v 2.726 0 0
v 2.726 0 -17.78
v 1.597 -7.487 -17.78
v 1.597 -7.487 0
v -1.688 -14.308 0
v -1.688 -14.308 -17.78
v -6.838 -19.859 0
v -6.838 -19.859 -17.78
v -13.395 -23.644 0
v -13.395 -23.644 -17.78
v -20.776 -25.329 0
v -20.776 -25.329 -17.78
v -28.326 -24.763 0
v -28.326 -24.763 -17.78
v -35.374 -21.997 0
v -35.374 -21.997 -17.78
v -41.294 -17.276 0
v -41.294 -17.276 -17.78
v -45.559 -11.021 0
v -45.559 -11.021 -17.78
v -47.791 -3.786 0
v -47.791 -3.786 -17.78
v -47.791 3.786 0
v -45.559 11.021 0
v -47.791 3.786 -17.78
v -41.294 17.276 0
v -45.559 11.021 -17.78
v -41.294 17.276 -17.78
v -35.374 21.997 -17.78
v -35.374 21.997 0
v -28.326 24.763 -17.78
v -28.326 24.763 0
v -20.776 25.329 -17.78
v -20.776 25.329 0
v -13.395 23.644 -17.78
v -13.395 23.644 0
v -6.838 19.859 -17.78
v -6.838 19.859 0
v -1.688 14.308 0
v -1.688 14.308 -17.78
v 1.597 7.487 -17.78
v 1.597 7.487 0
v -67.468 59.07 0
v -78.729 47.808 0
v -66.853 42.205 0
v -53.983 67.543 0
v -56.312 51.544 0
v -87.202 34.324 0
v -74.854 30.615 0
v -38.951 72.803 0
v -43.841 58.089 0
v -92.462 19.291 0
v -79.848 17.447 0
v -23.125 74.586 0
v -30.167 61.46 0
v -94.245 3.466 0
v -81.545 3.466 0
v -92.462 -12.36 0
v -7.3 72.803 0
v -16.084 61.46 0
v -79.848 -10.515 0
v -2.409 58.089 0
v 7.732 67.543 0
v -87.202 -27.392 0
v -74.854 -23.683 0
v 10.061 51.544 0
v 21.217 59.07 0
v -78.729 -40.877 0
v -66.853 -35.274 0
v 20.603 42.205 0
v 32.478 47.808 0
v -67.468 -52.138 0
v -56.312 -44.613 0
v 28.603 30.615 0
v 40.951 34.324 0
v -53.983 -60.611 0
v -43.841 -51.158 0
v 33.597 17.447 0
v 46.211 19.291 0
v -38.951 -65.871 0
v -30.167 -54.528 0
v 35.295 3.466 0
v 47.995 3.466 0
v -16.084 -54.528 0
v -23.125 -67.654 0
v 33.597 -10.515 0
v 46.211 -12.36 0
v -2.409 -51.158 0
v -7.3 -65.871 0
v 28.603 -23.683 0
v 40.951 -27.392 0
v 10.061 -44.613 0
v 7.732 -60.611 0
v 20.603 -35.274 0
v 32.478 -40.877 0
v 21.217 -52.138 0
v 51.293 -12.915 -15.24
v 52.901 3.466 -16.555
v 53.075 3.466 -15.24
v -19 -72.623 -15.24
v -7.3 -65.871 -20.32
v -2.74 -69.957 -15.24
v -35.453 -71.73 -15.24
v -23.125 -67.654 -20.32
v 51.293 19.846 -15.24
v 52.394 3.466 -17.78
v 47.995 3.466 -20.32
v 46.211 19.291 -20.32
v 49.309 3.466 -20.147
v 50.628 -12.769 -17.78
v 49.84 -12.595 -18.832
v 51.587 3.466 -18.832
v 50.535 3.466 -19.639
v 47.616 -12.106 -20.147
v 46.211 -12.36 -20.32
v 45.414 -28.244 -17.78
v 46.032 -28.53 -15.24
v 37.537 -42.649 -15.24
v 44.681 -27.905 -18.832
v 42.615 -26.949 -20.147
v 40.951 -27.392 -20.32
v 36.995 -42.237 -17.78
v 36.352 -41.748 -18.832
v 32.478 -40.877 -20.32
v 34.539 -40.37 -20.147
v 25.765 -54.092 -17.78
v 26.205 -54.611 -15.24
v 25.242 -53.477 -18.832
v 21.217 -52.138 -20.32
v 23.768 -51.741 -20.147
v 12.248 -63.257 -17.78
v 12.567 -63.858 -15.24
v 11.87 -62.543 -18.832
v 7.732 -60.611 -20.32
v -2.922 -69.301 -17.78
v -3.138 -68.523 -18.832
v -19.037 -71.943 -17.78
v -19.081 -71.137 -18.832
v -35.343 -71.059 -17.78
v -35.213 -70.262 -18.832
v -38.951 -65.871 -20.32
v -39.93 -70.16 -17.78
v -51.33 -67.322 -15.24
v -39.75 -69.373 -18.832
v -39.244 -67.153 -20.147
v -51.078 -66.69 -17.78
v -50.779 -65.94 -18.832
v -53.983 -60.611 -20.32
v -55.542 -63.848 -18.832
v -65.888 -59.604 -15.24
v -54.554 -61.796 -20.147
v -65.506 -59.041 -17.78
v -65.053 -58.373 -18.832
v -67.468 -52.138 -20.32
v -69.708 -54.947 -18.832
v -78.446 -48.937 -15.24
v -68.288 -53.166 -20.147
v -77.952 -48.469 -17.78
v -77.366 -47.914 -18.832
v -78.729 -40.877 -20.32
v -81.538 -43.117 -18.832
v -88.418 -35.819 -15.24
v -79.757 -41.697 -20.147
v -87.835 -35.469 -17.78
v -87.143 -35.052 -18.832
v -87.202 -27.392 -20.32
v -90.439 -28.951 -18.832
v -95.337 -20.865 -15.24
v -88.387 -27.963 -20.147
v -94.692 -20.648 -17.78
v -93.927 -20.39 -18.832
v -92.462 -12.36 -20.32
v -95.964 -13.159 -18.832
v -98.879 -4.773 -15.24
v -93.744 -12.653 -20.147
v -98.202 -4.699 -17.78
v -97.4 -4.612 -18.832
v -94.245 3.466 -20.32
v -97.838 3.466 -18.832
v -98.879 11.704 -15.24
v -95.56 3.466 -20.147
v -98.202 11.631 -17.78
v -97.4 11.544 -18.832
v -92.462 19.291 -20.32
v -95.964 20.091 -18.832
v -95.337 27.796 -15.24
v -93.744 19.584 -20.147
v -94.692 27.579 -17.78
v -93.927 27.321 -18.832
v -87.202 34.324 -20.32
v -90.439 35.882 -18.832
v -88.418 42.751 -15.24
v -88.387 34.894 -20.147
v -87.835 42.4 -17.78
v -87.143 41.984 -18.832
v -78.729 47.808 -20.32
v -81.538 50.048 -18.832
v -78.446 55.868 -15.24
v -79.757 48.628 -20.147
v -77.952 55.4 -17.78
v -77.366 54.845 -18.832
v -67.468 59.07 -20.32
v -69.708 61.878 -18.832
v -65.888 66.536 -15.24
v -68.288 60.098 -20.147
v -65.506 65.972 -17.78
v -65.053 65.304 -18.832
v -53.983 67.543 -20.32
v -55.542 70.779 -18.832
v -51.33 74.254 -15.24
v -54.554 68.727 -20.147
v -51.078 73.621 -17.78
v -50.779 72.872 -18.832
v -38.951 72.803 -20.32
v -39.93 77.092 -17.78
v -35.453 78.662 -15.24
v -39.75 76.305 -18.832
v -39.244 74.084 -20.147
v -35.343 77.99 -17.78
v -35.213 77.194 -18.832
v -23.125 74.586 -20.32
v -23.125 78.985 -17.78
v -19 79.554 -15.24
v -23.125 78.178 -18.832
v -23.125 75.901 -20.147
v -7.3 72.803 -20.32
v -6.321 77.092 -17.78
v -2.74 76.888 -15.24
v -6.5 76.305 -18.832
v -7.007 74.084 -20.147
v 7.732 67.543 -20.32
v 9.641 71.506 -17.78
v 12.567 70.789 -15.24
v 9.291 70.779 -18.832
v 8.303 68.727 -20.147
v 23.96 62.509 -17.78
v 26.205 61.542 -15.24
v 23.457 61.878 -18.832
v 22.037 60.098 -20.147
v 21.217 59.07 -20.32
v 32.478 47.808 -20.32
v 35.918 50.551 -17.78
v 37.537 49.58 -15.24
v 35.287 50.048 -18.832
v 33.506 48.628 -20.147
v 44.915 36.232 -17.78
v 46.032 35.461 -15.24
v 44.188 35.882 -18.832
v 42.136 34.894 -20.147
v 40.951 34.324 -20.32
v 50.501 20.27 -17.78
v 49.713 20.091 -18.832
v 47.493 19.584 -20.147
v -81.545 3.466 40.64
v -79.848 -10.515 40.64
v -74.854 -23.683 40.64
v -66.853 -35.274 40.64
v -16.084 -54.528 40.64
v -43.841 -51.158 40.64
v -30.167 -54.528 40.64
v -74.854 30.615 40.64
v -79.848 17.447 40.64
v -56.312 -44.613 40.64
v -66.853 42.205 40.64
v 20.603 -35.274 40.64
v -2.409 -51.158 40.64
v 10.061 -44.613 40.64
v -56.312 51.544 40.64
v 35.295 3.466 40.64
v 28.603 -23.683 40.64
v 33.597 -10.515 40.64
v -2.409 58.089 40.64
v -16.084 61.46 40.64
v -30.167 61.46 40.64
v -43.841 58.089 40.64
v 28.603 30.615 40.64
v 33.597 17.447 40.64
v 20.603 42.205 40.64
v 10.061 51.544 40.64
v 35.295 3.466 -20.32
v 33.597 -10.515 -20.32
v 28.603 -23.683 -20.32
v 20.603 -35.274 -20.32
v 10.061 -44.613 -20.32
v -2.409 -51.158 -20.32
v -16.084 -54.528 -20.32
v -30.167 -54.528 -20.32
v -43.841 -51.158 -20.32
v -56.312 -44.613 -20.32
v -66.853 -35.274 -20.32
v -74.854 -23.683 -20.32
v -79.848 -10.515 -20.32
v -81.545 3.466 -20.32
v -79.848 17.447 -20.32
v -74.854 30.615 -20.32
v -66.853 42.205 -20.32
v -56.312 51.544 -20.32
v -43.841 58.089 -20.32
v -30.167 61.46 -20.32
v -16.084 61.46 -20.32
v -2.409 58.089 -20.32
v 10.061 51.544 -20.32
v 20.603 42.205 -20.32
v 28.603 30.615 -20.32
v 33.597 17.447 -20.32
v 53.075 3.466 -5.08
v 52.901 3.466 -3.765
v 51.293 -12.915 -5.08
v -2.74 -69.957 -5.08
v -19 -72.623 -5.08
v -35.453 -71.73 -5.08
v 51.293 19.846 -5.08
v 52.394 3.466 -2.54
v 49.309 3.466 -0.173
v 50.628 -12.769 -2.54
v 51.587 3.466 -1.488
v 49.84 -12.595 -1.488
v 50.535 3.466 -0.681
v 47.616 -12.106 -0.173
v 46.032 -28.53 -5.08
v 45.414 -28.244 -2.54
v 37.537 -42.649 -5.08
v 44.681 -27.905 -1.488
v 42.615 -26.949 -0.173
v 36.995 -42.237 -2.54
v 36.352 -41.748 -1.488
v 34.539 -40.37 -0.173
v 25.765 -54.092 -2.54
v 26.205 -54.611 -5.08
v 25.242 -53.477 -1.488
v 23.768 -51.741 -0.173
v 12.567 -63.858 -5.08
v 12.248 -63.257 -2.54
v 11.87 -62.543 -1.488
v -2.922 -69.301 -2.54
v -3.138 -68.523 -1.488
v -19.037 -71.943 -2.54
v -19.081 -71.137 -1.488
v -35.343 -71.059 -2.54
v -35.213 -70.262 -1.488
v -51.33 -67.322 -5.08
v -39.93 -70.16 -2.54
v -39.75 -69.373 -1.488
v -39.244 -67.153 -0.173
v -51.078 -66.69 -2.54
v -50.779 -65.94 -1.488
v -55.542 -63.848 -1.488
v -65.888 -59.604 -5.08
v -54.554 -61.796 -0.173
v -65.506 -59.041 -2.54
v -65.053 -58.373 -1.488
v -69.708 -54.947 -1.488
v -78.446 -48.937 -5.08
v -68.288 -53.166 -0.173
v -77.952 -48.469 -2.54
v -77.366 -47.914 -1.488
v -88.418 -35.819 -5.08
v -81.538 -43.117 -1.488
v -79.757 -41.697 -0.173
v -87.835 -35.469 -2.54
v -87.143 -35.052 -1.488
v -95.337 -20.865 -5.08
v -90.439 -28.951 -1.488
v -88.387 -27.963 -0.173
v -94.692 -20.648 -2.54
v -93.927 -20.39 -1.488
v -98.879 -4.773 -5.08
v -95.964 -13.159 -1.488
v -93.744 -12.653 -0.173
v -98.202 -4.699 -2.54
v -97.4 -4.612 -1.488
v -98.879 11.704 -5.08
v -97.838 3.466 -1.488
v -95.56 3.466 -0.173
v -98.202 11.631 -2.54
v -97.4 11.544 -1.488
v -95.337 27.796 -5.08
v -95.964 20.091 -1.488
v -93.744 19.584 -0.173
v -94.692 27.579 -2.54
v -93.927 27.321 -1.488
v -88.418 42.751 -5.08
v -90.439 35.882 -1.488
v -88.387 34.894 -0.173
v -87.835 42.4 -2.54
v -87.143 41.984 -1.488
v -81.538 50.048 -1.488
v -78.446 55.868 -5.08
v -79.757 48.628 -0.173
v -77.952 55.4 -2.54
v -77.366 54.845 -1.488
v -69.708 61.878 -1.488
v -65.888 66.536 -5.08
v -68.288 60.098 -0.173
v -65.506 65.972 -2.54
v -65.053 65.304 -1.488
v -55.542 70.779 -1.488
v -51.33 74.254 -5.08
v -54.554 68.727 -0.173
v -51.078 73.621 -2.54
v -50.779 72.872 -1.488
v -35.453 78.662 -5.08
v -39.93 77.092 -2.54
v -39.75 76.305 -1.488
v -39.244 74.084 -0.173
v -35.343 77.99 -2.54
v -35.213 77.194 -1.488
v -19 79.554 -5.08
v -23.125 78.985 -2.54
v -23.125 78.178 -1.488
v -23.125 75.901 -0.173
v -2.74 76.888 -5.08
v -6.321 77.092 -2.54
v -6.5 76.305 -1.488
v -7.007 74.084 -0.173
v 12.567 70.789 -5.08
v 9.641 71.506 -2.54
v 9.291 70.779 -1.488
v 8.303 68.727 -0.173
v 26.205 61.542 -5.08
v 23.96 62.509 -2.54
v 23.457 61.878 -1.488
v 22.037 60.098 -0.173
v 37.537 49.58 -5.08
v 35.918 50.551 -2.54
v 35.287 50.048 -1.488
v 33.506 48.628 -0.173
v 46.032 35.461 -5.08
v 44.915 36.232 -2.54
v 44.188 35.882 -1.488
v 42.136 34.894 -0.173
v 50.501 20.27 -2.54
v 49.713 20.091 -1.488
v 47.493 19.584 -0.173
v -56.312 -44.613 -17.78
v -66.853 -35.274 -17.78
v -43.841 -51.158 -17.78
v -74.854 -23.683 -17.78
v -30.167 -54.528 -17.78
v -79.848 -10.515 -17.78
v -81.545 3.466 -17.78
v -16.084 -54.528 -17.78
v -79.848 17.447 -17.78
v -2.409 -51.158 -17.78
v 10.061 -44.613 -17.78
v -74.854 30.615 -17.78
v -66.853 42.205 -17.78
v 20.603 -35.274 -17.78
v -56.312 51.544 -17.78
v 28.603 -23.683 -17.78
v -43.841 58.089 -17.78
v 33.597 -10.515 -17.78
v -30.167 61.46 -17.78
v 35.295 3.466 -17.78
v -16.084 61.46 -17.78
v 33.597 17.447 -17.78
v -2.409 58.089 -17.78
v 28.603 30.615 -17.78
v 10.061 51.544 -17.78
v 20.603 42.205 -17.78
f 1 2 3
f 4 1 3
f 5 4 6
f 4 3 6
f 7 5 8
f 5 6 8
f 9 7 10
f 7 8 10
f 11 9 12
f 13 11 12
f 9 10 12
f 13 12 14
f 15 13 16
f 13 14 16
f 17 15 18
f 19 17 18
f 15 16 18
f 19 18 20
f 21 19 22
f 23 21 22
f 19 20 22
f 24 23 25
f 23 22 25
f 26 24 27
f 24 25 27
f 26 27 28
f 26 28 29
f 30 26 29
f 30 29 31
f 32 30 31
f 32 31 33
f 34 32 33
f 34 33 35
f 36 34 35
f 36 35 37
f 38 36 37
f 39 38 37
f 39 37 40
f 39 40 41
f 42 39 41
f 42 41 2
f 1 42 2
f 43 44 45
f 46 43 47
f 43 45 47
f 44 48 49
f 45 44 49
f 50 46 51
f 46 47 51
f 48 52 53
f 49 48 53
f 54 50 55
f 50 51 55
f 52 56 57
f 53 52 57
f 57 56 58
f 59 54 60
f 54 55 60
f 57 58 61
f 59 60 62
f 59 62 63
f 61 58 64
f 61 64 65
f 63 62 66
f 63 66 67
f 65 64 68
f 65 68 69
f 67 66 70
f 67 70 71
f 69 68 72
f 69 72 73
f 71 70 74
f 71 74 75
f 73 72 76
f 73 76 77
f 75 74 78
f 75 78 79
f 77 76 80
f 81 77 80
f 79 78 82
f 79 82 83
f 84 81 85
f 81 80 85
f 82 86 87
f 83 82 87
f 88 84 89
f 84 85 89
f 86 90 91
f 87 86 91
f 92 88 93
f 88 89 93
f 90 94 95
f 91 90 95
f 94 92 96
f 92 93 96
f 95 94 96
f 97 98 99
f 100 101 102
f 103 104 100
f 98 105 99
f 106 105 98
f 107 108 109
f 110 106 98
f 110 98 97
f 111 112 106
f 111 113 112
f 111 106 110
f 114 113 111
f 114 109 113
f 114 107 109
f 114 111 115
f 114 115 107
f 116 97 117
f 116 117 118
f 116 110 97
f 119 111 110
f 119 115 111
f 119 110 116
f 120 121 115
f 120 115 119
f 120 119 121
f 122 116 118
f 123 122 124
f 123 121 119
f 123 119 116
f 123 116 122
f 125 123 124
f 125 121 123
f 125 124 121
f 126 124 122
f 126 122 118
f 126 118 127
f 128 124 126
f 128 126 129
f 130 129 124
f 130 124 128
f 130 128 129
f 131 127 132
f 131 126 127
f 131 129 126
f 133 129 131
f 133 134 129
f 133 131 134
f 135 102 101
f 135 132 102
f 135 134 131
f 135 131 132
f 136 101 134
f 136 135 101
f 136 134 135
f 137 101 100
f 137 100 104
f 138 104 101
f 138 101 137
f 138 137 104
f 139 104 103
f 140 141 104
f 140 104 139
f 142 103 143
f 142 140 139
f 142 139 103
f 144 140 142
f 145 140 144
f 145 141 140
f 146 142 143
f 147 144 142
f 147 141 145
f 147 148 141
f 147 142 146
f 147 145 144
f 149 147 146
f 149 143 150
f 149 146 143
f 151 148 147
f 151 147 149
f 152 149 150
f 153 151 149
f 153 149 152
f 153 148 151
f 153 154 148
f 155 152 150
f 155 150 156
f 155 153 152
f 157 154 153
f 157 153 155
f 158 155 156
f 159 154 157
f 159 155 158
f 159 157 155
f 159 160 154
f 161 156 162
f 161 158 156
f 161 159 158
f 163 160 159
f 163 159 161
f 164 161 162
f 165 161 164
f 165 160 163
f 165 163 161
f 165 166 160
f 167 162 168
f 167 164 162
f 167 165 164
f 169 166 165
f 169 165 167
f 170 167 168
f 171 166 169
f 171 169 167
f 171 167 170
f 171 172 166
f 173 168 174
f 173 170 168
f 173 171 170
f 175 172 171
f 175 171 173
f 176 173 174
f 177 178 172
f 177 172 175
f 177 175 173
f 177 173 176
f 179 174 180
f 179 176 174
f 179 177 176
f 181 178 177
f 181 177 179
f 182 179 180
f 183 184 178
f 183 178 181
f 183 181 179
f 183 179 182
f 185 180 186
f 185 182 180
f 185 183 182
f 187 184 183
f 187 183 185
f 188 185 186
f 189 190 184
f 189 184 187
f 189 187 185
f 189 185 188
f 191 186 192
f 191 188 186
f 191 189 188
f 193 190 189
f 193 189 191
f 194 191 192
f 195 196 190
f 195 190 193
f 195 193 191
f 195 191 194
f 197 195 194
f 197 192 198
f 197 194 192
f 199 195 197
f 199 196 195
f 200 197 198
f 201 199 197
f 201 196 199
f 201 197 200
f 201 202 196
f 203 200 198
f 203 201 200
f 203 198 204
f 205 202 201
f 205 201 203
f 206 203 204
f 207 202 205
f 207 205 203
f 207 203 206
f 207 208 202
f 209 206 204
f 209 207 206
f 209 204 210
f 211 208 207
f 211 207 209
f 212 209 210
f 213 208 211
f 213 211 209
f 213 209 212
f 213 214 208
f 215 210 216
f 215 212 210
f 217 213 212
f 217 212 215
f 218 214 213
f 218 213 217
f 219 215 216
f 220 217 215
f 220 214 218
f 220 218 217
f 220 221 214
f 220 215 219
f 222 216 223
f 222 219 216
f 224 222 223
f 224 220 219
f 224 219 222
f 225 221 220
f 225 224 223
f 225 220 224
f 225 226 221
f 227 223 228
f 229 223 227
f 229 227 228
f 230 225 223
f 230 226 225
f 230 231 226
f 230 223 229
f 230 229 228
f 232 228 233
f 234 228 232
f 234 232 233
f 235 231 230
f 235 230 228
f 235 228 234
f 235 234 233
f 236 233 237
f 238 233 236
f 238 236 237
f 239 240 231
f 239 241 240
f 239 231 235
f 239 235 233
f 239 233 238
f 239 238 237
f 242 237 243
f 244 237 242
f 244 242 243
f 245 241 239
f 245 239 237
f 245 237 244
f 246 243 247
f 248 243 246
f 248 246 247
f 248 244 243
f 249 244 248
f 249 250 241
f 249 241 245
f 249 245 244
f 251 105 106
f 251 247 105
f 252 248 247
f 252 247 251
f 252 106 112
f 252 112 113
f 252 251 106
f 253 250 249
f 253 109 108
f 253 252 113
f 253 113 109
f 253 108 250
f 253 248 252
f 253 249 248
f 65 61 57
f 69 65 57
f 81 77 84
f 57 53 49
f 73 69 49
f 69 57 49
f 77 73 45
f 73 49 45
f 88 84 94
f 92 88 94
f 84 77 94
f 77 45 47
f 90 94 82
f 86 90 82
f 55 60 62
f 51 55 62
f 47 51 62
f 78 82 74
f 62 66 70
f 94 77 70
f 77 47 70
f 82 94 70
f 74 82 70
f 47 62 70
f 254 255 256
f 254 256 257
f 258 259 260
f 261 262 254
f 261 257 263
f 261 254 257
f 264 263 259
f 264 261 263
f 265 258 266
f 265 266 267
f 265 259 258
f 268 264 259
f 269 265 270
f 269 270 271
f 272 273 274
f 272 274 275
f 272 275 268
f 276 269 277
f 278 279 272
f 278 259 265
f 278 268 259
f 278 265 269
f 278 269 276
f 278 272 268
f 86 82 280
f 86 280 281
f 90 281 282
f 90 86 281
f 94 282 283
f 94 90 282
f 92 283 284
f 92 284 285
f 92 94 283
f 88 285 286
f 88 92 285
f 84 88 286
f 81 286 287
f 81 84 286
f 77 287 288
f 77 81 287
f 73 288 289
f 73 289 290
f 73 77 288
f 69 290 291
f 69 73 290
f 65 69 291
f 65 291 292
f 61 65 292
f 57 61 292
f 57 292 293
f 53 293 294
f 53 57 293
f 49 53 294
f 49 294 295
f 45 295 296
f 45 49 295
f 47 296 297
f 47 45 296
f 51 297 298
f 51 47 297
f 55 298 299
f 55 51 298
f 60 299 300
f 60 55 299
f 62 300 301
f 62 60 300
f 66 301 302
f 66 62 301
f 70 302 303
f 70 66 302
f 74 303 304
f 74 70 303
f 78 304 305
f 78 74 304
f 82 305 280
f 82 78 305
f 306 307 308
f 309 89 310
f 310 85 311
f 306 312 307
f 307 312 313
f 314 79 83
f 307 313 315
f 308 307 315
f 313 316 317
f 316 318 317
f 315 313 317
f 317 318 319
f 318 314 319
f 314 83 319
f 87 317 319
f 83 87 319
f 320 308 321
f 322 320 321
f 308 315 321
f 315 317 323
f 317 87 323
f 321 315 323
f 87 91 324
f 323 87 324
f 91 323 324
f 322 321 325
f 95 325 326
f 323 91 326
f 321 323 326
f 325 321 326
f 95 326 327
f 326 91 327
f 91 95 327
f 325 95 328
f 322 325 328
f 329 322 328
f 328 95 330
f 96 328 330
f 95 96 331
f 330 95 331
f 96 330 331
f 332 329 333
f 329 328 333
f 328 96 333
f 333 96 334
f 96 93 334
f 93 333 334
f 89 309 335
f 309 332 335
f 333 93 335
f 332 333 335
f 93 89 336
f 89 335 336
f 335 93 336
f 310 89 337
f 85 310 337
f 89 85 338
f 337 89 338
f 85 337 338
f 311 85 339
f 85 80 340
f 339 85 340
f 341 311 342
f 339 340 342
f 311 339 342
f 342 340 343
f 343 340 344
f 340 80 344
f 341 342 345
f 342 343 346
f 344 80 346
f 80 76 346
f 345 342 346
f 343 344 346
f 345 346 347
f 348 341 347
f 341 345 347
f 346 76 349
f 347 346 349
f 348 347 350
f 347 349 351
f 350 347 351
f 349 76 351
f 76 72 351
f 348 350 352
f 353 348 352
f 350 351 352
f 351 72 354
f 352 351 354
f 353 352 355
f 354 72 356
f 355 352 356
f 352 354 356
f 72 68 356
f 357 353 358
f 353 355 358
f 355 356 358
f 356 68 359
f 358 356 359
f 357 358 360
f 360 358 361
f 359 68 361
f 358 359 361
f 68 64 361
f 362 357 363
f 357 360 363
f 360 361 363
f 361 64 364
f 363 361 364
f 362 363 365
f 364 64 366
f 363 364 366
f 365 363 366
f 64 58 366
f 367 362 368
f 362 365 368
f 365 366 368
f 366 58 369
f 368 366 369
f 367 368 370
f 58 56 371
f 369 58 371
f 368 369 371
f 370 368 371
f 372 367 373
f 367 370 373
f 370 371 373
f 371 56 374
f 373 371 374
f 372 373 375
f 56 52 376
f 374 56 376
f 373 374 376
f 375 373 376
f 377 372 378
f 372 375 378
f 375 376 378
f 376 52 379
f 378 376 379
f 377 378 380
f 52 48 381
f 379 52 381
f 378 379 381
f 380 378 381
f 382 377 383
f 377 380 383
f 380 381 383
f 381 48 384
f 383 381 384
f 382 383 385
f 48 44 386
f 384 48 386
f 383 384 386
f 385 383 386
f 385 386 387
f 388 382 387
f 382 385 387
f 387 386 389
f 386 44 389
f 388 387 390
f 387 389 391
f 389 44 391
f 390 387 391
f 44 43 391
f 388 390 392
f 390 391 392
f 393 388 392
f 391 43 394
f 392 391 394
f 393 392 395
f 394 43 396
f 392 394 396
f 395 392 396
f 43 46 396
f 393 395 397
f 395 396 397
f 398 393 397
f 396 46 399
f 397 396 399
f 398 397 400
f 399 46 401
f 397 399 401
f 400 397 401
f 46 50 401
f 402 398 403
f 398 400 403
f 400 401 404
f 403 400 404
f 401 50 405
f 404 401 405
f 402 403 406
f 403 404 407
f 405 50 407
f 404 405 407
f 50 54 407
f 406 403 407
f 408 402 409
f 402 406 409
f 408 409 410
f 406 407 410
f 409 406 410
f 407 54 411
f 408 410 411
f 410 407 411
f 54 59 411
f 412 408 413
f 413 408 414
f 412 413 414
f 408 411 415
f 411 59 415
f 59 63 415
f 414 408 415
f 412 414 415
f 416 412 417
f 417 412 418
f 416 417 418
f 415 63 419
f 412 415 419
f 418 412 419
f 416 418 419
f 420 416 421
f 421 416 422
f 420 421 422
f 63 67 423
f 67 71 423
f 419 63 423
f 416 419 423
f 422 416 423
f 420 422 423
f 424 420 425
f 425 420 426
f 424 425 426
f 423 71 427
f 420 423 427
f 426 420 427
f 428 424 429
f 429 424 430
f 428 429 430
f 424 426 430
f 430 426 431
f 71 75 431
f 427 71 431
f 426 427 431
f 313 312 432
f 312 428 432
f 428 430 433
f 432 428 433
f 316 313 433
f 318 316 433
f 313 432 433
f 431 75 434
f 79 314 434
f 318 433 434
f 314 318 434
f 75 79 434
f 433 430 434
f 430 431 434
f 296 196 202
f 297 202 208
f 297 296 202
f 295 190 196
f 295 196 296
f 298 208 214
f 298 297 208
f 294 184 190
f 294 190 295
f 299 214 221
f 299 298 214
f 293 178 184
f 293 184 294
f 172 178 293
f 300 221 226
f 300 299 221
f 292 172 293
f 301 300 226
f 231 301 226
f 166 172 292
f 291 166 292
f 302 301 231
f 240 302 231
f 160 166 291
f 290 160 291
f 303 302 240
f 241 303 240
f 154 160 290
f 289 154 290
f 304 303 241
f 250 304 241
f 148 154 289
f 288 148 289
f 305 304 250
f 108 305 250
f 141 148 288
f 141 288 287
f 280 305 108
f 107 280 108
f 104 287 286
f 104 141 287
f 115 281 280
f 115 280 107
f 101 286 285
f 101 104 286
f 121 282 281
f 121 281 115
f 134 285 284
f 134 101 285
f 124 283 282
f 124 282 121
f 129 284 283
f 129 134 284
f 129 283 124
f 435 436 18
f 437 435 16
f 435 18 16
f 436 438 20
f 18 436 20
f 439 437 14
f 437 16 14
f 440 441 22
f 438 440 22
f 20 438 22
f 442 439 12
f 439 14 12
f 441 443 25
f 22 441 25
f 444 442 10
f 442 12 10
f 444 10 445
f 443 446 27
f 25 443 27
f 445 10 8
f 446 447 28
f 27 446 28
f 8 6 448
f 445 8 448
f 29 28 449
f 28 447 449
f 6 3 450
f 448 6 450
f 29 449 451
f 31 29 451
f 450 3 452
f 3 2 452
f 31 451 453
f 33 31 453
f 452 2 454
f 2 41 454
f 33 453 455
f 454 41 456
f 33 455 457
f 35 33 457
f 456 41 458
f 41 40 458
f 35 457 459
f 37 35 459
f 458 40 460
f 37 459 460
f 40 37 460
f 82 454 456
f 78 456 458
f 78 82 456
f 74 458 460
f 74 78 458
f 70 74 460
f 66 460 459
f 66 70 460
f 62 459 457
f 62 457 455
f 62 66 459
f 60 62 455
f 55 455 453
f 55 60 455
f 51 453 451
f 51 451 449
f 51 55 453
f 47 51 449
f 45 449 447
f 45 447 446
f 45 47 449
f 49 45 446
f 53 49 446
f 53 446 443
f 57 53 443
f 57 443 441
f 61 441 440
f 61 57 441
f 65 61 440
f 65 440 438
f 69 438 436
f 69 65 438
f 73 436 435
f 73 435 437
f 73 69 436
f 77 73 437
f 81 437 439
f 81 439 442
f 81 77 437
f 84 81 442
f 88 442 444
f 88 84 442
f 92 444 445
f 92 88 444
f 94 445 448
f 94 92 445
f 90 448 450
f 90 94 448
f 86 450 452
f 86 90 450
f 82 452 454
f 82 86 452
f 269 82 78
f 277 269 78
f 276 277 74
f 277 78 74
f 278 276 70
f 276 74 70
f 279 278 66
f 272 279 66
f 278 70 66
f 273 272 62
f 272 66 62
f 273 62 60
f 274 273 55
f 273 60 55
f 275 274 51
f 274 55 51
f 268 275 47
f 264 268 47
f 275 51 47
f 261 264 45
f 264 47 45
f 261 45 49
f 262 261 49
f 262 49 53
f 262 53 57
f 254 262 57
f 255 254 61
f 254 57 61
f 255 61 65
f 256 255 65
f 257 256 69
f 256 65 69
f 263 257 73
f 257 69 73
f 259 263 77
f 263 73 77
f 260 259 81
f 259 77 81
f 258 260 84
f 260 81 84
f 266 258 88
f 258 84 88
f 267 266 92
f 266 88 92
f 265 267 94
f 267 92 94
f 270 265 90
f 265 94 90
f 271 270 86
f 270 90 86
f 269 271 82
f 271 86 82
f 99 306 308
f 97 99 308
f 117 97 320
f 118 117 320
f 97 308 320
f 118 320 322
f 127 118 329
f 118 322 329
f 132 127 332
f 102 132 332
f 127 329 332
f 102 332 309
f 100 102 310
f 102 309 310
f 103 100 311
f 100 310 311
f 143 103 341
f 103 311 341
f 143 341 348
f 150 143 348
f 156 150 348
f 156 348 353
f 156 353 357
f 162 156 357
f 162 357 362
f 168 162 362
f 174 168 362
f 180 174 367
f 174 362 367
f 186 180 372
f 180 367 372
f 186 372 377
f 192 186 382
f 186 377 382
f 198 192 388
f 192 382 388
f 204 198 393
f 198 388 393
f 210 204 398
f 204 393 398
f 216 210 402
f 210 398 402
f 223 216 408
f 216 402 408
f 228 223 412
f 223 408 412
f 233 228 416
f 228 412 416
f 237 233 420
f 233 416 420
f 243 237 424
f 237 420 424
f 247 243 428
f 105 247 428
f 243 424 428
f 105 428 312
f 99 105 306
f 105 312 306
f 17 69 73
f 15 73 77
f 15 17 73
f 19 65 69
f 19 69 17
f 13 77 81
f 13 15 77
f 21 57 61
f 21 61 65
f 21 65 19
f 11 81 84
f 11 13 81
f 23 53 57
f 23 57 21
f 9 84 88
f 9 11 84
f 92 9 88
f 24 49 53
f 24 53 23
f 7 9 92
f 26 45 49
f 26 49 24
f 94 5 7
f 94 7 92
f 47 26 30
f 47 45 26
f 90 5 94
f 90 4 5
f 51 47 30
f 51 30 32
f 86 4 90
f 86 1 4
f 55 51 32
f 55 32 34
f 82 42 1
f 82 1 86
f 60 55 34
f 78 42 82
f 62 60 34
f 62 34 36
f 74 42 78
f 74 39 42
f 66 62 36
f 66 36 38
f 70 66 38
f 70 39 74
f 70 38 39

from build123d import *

# Parameters (mm, degrees)
F0_R     = 58.42
F1_DEPTH = 40.64
F2_R     = 76.2
F2_R_2   = 58.42
F3_DEPTH = 20.32
F4_R     = 5.08
F5_DEPTH = 17.78
F7_R     = 25.4
F8_DEPTH = 45.974


with BuildPart() as f1:
    # F0 (on Top) → F1 (new body)
    with BuildSketch(Plane.XY):
        with Locations((-23.1254743153, 3.4657202779)):
            Circle(F0_R)
    extrude(amount=F1_DEPTH)


with BuildPart() as f3:
    # F2 (on face) → F3 (new body)
    with BuildSketch(Plane(origin=(0, 0, 0), x_dir=(1, 0, 0), z_dir=(0, 0, -1))):
        with Locations((-23.1254743153, -3.4657202779)):
            Circle(F2_R)
        with Locations((-23.1254743153, -3.4657202779)):
            Circle(F2_R_2, mode=Mode.SUBTRACT)
    extrude(amount=F3_DEPTH)

    # F4
    f4_edges = [f3.edges().sort_by_distance(p)[0] for p in [
        (53.074526, 3.46572, -10.16),
        (-99.325474, 3.46572, 0),
        (-99.325474, 3.46572, -20.32),
    ]]
    fillet(f4_edges, radius=F4_R)


with BuildPart() as f5:
    # F5 (new): a face of the model
    f5_faces = [f1.part.faces().sort_by_distance(p)[0] for p in [
        (-23.1254743153, 3.4657202779, 0),
    ]]
    extrude(f5_faces, amount=F5_DEPTH)

    # F7 (on face) → F8 (cut)
    with BuildSketch(Plane(origin=(0, 0, -17.78), x_dir=(1, 0, 0), z_dir=(0, 0, -1))):
        with Locations((-22.6742904633, 0)):
            Circle(F7_R)
    extrude(amount=-F8_DEPTH, mode=Mode.SUBTRACT)


solid = Compound([f1.part, f3.part, f5.part])
